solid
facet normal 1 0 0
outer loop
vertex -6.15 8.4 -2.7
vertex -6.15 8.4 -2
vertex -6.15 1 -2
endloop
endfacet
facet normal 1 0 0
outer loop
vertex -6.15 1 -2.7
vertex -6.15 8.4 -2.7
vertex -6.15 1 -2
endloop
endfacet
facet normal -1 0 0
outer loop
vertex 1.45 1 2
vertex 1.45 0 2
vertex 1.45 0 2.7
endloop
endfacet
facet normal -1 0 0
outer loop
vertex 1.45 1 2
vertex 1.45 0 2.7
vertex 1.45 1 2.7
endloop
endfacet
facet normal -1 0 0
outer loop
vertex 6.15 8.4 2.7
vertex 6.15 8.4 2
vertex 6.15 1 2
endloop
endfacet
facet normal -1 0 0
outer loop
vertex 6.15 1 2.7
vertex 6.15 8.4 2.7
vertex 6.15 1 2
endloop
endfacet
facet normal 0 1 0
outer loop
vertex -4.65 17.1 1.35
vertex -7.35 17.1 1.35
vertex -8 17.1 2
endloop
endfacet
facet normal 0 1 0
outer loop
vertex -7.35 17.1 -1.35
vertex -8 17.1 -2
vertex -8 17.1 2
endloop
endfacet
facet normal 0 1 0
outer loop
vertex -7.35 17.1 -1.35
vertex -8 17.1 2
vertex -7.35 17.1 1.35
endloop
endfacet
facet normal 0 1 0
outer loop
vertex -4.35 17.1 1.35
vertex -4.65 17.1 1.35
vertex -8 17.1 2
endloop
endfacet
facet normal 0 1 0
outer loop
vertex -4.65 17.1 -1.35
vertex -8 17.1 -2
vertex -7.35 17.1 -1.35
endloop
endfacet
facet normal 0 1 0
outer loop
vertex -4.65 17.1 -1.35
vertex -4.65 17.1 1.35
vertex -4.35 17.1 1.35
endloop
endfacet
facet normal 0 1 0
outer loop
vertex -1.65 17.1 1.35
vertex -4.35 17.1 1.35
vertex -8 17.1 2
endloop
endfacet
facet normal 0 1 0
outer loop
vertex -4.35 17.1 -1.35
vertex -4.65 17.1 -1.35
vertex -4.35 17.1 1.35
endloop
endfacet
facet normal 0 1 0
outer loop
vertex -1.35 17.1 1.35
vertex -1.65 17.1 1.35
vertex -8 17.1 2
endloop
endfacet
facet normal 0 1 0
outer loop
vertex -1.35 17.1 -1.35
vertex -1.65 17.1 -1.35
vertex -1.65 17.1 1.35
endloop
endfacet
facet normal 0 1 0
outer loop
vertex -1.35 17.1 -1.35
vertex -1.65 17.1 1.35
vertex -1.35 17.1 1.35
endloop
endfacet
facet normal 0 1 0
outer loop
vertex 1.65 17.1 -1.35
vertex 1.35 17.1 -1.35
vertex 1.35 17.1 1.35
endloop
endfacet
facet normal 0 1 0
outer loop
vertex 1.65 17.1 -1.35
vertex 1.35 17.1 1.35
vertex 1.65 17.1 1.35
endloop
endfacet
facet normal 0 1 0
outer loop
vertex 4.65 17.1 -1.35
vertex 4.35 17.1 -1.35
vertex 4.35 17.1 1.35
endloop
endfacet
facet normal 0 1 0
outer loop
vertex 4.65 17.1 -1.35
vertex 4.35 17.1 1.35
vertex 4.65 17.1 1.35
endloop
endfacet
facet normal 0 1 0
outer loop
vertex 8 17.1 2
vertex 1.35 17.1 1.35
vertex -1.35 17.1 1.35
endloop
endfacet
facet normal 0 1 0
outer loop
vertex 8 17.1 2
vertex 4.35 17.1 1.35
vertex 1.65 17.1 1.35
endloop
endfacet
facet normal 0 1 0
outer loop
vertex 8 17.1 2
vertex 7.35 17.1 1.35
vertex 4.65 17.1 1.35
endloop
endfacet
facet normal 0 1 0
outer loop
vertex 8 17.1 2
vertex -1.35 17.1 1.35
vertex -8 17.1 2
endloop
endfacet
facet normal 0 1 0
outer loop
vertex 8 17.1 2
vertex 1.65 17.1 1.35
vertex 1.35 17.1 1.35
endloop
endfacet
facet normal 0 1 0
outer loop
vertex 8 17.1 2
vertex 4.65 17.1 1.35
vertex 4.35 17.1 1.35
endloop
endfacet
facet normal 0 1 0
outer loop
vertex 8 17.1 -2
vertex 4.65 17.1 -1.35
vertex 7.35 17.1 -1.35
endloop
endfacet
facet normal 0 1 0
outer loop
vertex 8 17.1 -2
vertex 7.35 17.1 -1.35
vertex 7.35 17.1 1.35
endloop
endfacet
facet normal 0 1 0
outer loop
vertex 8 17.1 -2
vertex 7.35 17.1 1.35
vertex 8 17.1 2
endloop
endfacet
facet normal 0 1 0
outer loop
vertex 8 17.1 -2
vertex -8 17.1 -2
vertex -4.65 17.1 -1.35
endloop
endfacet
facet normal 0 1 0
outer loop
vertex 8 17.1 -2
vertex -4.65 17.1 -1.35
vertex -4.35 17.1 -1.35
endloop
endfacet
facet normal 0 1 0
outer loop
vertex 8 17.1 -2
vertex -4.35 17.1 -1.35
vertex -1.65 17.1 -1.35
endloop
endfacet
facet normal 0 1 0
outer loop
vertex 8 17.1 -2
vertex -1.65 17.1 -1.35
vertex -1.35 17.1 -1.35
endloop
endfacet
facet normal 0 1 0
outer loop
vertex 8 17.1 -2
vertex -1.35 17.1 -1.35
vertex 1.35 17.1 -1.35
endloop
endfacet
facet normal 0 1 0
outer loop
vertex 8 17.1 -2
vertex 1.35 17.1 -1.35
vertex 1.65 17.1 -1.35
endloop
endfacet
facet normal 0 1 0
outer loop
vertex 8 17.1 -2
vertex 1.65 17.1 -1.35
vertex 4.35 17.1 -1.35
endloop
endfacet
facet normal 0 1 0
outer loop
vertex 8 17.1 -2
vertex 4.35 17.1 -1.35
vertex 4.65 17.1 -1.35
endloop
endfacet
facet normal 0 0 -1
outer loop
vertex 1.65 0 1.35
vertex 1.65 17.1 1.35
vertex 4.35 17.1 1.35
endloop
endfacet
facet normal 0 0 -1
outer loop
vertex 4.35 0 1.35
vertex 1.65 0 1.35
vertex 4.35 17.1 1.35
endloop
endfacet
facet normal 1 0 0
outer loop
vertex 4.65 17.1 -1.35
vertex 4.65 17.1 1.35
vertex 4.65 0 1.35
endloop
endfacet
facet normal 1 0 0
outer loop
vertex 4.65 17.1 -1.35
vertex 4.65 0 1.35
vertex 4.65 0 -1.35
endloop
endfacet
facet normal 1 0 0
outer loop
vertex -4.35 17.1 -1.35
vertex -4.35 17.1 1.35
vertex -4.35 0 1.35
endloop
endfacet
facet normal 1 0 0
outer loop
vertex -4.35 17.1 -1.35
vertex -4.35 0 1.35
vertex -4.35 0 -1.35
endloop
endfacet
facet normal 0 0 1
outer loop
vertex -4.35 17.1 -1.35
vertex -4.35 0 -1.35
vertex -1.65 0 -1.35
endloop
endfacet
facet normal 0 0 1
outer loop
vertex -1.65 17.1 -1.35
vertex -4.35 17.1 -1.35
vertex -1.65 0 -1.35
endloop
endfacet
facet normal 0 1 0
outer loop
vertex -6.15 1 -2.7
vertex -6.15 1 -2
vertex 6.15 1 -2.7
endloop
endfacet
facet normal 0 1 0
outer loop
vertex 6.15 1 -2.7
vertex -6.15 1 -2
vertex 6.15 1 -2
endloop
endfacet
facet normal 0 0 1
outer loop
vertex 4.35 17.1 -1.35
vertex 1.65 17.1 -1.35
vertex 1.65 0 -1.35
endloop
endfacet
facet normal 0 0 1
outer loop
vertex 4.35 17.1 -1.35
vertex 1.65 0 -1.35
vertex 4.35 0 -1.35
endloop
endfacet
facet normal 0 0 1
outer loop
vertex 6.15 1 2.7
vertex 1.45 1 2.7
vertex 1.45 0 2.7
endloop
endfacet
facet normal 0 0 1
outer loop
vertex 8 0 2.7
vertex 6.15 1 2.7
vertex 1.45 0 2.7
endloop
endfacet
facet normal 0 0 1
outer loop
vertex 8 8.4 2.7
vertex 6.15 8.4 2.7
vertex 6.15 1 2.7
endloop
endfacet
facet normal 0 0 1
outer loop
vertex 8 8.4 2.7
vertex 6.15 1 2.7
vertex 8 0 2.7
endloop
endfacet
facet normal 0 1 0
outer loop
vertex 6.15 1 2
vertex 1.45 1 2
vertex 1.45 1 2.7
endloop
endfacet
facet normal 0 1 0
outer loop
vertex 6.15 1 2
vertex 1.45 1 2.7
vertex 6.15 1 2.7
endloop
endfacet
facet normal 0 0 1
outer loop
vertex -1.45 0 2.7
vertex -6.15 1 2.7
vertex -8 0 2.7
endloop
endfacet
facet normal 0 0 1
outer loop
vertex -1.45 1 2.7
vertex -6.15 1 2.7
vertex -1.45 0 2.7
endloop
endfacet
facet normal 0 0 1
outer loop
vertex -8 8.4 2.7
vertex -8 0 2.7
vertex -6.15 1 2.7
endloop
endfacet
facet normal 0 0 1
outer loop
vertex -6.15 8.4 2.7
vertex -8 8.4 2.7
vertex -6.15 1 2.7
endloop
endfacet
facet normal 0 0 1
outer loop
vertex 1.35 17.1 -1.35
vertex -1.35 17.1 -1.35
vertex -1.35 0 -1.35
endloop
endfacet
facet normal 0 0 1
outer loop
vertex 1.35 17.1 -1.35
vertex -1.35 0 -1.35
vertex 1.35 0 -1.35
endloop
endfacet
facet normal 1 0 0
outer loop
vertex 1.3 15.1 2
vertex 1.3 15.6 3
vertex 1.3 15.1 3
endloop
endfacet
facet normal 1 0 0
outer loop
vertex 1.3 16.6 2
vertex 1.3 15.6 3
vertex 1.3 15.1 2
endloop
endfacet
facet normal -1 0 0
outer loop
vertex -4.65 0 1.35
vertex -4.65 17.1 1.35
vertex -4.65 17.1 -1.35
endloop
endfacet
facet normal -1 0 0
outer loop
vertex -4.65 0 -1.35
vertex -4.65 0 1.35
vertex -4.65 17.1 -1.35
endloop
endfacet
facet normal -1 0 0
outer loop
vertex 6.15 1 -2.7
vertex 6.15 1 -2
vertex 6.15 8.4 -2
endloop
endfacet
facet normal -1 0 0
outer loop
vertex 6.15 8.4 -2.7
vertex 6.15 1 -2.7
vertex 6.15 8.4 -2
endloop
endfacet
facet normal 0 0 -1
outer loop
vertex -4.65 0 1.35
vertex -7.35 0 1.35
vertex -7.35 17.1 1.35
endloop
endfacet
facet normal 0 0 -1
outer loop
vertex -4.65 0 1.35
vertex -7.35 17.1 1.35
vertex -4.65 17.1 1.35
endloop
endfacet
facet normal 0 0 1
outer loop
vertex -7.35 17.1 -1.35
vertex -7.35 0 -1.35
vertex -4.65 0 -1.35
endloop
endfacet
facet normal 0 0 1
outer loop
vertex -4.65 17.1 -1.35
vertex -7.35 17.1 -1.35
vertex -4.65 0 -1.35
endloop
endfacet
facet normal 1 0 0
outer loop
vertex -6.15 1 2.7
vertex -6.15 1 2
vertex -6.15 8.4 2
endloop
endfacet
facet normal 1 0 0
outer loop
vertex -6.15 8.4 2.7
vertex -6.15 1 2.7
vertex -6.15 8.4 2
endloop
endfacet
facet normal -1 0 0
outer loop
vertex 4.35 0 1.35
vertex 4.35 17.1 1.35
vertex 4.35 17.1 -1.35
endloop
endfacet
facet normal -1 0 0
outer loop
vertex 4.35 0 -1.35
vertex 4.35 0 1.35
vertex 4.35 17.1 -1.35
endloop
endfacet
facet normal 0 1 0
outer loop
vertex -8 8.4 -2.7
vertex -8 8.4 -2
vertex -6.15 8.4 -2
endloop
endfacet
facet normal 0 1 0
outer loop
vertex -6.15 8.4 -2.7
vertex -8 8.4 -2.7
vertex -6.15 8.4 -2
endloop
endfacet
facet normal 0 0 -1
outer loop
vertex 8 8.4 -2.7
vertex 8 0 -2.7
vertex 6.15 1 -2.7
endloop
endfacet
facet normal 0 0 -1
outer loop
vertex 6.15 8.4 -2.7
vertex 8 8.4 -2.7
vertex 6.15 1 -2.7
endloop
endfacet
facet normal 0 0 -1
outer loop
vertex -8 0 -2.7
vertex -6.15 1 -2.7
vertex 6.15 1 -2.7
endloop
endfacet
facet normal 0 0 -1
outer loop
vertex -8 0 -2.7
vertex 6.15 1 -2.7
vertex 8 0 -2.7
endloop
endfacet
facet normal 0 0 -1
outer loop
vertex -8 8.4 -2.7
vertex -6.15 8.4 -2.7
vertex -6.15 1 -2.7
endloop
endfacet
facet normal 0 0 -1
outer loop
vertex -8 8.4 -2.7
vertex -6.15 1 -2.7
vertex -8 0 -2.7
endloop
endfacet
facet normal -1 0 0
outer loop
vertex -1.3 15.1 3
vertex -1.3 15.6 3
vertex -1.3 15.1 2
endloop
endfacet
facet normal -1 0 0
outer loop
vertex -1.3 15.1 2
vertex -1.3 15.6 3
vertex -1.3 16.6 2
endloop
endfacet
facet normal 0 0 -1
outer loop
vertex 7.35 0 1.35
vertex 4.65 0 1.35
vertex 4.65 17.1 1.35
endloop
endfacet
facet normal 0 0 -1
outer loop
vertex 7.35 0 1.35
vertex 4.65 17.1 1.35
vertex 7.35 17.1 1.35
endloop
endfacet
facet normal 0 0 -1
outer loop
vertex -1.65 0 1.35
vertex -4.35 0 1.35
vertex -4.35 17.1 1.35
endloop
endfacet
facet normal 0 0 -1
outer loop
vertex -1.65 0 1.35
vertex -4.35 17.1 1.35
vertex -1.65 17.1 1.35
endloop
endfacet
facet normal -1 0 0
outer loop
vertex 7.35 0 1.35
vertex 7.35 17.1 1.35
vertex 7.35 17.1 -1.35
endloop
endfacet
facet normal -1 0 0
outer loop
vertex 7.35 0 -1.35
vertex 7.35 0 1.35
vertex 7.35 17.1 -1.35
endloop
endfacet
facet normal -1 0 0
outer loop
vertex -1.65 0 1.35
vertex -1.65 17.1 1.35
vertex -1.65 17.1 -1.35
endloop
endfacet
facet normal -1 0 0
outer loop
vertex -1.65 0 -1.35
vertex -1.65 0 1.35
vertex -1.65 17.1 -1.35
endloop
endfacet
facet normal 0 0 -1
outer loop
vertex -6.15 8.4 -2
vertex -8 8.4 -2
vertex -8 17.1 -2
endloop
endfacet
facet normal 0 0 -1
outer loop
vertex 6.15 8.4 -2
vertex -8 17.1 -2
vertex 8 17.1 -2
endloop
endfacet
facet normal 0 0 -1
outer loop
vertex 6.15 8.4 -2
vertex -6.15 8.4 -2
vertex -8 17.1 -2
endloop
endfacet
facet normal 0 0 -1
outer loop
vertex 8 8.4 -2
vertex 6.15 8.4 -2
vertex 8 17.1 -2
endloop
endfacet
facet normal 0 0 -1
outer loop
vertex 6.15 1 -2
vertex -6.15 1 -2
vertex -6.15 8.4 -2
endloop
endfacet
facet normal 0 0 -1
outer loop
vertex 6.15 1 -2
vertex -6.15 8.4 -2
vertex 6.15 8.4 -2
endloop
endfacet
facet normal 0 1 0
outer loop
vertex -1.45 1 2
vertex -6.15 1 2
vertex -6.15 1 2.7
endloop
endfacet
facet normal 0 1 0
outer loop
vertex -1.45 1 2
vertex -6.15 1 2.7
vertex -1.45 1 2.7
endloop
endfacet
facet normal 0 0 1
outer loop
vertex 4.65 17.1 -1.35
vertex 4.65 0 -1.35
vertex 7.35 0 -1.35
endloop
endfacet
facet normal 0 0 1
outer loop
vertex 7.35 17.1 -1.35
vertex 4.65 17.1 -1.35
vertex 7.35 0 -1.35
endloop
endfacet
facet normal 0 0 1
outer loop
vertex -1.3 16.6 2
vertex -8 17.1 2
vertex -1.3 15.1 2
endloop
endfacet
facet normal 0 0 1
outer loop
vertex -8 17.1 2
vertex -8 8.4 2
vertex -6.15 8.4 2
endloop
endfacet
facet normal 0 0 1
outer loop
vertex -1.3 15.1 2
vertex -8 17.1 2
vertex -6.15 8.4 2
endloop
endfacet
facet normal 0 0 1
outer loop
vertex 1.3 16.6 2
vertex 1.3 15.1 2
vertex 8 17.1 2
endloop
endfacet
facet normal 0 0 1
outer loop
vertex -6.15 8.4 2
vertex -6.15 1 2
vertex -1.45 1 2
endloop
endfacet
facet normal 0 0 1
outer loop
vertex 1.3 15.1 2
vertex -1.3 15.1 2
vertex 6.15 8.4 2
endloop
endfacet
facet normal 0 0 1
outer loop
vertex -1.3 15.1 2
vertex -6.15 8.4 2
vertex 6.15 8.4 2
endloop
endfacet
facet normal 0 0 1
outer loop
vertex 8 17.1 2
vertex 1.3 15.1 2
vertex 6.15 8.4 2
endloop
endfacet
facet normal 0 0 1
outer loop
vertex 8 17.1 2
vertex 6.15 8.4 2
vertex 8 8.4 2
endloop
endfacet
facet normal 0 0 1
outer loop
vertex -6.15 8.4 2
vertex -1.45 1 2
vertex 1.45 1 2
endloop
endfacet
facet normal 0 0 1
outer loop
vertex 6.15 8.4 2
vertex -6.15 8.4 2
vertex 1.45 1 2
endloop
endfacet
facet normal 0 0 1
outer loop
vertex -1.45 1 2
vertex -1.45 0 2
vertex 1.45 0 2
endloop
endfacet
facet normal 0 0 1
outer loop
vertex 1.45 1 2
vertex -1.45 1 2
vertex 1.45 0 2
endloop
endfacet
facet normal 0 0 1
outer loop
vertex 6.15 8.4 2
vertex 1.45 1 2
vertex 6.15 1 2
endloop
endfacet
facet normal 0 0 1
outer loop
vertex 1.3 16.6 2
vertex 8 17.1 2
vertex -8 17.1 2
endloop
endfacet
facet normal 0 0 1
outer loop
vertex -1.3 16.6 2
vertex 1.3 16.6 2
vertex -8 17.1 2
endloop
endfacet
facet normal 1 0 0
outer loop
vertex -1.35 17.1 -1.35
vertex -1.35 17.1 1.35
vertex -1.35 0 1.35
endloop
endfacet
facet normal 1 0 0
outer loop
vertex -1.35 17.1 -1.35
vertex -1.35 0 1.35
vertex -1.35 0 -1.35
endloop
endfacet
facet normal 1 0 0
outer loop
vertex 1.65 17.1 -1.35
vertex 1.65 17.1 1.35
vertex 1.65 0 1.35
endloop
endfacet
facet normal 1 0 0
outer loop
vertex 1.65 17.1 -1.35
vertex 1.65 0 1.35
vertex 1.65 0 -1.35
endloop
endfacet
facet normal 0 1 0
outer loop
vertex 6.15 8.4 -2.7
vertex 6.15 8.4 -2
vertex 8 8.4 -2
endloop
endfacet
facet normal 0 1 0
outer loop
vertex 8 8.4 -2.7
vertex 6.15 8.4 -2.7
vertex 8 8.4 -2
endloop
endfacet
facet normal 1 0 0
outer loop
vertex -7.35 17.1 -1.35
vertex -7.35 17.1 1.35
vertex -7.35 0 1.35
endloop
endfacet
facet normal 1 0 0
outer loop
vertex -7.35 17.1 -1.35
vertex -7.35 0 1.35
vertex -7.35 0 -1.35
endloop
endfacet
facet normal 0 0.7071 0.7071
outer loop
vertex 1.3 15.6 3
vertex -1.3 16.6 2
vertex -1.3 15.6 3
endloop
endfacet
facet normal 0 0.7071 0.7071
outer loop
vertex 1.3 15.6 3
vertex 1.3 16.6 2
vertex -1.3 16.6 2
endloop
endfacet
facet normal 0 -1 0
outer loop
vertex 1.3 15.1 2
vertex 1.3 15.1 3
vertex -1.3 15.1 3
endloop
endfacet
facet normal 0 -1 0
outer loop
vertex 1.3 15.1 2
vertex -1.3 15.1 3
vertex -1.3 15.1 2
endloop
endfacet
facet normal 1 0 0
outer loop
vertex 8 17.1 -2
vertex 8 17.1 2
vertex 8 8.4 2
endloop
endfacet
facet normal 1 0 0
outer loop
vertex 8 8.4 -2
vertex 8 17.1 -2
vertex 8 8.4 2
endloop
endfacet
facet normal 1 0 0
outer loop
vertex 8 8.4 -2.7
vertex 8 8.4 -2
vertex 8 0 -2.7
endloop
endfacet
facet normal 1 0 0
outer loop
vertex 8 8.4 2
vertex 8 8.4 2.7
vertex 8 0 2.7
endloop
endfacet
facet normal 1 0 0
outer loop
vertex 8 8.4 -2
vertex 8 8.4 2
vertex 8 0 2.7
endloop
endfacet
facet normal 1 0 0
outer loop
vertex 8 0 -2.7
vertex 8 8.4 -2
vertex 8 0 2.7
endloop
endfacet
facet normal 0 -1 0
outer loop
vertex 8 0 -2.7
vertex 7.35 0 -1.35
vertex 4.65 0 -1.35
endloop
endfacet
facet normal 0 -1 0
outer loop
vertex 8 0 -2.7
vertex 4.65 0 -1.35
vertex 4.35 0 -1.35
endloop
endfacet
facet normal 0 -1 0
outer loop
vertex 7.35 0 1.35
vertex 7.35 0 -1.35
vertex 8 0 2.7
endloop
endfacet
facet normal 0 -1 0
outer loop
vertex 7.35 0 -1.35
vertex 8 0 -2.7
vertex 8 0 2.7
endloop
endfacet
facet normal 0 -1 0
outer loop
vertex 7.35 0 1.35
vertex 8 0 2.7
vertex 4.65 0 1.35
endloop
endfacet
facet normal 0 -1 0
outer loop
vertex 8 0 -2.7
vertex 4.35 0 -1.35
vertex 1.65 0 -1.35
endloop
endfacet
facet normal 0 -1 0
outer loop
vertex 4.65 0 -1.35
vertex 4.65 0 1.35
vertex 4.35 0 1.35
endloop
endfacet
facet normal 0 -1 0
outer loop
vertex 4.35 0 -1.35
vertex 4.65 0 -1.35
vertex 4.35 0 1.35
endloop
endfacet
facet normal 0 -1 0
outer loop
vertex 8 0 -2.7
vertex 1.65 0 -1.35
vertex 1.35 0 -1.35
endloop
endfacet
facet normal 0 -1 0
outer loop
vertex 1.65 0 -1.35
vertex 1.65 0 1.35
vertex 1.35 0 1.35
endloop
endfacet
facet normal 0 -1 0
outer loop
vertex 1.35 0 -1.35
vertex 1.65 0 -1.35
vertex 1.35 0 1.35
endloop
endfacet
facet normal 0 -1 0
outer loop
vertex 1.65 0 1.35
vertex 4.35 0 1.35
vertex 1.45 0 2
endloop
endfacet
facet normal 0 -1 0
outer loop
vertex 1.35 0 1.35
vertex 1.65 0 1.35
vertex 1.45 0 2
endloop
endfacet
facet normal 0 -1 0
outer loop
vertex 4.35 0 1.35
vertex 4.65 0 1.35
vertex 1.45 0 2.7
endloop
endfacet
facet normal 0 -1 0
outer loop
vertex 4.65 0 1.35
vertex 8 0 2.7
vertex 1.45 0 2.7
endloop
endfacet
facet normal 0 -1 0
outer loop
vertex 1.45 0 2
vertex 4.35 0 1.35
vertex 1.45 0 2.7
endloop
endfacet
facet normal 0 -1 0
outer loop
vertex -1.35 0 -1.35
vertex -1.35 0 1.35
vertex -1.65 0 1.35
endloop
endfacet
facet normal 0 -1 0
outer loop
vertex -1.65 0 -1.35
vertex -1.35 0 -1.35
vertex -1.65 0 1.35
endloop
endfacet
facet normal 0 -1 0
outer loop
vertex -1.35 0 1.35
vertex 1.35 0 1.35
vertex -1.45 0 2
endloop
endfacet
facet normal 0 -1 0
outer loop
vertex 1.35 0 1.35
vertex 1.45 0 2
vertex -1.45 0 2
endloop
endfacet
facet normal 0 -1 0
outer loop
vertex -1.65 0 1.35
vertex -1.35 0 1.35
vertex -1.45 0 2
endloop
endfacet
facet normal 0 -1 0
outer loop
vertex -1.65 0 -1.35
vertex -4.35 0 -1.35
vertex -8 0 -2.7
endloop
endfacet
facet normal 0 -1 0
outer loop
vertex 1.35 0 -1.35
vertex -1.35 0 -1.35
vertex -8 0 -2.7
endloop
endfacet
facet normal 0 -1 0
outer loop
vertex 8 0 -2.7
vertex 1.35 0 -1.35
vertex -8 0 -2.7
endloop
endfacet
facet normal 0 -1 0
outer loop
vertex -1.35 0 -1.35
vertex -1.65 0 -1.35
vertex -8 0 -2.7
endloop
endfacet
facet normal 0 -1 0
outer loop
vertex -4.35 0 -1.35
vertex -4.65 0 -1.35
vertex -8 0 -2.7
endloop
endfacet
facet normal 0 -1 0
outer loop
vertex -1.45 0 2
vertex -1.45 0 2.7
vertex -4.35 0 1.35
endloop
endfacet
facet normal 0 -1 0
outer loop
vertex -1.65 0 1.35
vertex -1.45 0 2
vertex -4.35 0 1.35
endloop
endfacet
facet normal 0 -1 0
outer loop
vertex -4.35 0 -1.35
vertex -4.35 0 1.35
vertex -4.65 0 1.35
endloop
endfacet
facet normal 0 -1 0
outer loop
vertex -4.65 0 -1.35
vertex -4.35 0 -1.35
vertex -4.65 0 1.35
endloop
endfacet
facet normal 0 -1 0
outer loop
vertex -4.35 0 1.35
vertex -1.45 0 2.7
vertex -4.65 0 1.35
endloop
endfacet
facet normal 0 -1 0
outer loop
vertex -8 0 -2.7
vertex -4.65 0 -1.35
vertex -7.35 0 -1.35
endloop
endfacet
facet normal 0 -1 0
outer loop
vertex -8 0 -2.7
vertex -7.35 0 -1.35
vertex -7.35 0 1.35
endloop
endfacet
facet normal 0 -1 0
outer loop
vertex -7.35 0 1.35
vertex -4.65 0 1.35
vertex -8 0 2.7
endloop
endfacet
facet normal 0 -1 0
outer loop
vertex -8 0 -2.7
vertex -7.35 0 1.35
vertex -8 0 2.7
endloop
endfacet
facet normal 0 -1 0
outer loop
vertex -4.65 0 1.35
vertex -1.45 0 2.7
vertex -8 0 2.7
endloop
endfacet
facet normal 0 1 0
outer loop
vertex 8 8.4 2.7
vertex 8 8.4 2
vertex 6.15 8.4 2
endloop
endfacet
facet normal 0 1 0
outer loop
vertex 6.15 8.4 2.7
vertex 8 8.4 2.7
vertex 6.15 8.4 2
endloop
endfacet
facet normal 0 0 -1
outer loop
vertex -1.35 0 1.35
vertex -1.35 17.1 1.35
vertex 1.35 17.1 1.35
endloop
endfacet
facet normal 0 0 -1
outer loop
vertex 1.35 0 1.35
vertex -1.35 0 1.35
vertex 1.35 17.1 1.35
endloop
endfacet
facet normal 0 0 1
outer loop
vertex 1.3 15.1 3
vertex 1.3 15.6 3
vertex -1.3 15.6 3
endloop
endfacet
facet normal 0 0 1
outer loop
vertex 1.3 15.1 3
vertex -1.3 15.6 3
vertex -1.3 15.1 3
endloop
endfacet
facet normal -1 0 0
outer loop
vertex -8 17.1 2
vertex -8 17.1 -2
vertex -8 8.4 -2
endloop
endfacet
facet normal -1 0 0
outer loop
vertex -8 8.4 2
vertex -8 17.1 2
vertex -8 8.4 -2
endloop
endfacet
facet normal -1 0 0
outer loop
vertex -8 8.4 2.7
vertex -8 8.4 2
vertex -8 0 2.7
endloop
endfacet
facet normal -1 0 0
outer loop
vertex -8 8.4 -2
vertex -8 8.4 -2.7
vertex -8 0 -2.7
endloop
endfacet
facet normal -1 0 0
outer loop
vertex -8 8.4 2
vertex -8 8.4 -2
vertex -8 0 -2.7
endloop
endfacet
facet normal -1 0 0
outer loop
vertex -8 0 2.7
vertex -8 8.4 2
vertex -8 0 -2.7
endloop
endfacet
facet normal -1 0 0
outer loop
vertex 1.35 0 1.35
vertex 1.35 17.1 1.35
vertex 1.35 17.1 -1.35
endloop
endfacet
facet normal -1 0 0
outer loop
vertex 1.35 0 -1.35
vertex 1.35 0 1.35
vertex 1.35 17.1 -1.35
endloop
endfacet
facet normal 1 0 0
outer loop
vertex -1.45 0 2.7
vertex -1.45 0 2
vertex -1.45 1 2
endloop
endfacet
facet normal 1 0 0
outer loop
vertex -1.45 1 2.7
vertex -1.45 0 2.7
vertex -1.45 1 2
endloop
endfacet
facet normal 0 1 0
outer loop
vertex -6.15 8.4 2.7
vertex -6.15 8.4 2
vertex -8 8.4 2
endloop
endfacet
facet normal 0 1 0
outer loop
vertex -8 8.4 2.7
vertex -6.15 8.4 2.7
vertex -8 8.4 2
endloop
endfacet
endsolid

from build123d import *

# Parameters (mm, degrees)
SKETCH1_W           = 16
SKETCH1_H           = 4
SKETCH1_W_2         = 2.7
SKETCH1_H_2         = 2.7
BOSS_EXTRUDE1_DEPTH = 17.1
SKETCH2_W           = 4.7
SKETCH2_H           = 1
BOSS_EXTRUDE2_DEPTH = 0.7
BOSS_EXTRUDE3_DEPTH = 1.3
SKETCH4_W           = 2.9
SKETCH4_H           = 1
BOSS_EXTRUDE4_DEPTH = 0.7


with BuildPart() as part:
    # Sketch1 → Boss-Extrude1 (new body)
    with BuildSketch(Plane(origin=(0, 0, 0), x_dir=(1, 0, 0), z_dir=(0, 1, 0))):
        Rectangle(SKETCH1_W, SKETCH1_H)
        with Locations((3, 0)):
            Rectangle(SKETCH1_W_2, SKETCH1_H_2, mode=Mode.SUBTRACT)
        Rectangle(SKETCH1_W_2, SKETCH1_H_2, mode=Mode.SUBTRACT)
        with Locations((6, 0)):
            Rectangle(SKETCH1_W_2, SKETCH1_H_2, mode=Mode.SUBTRACT)
        with Locations((-6, 0)):
            Rectangle(SKETCH1_W_2, SKETCH1_H_2, mode=Mode.SUBTRACT)
        with Locations((-3, 0)):
            Rectangle(SKETCH1_W_2, SKETCH1_H_2, mode=Mode.SUBTRACT)
    extrude(amount=BOSS_EXTRUDE1_DEPTH)

    # Sketch2 → Boss-Extrude2 (add)
    with BuildSketch(Plane.XY.offset(2)):
        Polygon((-6.15, 8.4), (-8, 8.4), (-8, 0), (-6.15, 0), (-6.15, 1), align=None)
        with Locations((-3.8, 0.5)):
            Rectangle(SKETCH2_W, SKETCH2_H)
        with Locations((3.8, 0.5)):
            Rectangle(SKETCH2_W, SKETCH2_H)
        Polygon((6.15, 1), (6.15, 0), (8, 0), (8, 8.4), (6.15, 8.4), align=None)
    extrude(amount=BOSS_EXTRUDE2_DEPTH)

    # Sketch3 → Boss-Extrude3 (add, symmetric)
    with BuildSketch(Plane(origin=(0, 0, 0), x_dir=(0, 0, -1), z_dir=(1, 0, 0))):
        Polygon((-2, 16.6), (-3, 15.6), (-3, 15.1), (-2, 15.1), align=None)
    extrude(amount=BOSS_EXTRUDE3_DEPTH, both=True)

    # Sketch4 → Boss-Extrude4 (add)
    with BuildSketch(Plane(origin=(0, 0, -2), x_dir=(-1, 0, 0), z_dir=(0, 0, -1))):
        Polygon((-1.45, 0), (-1.45, 1), (-6.15, 1), (-6.15, 8.4), (-8, 8.4), (-8, 0), align=None)
        with Locations((0, 0.5)):
            Rectangle(SKETCH4_W, SKETCH4_H)
        Polygon((6.15, 8.4), (6.15, 1), (1.45, 1), (1.45, 0), (8, 0), (8, 8.4), align=None)
    extrude(amount=BOSS_EXTRUDE4_DEPTH)


solid = part.part
